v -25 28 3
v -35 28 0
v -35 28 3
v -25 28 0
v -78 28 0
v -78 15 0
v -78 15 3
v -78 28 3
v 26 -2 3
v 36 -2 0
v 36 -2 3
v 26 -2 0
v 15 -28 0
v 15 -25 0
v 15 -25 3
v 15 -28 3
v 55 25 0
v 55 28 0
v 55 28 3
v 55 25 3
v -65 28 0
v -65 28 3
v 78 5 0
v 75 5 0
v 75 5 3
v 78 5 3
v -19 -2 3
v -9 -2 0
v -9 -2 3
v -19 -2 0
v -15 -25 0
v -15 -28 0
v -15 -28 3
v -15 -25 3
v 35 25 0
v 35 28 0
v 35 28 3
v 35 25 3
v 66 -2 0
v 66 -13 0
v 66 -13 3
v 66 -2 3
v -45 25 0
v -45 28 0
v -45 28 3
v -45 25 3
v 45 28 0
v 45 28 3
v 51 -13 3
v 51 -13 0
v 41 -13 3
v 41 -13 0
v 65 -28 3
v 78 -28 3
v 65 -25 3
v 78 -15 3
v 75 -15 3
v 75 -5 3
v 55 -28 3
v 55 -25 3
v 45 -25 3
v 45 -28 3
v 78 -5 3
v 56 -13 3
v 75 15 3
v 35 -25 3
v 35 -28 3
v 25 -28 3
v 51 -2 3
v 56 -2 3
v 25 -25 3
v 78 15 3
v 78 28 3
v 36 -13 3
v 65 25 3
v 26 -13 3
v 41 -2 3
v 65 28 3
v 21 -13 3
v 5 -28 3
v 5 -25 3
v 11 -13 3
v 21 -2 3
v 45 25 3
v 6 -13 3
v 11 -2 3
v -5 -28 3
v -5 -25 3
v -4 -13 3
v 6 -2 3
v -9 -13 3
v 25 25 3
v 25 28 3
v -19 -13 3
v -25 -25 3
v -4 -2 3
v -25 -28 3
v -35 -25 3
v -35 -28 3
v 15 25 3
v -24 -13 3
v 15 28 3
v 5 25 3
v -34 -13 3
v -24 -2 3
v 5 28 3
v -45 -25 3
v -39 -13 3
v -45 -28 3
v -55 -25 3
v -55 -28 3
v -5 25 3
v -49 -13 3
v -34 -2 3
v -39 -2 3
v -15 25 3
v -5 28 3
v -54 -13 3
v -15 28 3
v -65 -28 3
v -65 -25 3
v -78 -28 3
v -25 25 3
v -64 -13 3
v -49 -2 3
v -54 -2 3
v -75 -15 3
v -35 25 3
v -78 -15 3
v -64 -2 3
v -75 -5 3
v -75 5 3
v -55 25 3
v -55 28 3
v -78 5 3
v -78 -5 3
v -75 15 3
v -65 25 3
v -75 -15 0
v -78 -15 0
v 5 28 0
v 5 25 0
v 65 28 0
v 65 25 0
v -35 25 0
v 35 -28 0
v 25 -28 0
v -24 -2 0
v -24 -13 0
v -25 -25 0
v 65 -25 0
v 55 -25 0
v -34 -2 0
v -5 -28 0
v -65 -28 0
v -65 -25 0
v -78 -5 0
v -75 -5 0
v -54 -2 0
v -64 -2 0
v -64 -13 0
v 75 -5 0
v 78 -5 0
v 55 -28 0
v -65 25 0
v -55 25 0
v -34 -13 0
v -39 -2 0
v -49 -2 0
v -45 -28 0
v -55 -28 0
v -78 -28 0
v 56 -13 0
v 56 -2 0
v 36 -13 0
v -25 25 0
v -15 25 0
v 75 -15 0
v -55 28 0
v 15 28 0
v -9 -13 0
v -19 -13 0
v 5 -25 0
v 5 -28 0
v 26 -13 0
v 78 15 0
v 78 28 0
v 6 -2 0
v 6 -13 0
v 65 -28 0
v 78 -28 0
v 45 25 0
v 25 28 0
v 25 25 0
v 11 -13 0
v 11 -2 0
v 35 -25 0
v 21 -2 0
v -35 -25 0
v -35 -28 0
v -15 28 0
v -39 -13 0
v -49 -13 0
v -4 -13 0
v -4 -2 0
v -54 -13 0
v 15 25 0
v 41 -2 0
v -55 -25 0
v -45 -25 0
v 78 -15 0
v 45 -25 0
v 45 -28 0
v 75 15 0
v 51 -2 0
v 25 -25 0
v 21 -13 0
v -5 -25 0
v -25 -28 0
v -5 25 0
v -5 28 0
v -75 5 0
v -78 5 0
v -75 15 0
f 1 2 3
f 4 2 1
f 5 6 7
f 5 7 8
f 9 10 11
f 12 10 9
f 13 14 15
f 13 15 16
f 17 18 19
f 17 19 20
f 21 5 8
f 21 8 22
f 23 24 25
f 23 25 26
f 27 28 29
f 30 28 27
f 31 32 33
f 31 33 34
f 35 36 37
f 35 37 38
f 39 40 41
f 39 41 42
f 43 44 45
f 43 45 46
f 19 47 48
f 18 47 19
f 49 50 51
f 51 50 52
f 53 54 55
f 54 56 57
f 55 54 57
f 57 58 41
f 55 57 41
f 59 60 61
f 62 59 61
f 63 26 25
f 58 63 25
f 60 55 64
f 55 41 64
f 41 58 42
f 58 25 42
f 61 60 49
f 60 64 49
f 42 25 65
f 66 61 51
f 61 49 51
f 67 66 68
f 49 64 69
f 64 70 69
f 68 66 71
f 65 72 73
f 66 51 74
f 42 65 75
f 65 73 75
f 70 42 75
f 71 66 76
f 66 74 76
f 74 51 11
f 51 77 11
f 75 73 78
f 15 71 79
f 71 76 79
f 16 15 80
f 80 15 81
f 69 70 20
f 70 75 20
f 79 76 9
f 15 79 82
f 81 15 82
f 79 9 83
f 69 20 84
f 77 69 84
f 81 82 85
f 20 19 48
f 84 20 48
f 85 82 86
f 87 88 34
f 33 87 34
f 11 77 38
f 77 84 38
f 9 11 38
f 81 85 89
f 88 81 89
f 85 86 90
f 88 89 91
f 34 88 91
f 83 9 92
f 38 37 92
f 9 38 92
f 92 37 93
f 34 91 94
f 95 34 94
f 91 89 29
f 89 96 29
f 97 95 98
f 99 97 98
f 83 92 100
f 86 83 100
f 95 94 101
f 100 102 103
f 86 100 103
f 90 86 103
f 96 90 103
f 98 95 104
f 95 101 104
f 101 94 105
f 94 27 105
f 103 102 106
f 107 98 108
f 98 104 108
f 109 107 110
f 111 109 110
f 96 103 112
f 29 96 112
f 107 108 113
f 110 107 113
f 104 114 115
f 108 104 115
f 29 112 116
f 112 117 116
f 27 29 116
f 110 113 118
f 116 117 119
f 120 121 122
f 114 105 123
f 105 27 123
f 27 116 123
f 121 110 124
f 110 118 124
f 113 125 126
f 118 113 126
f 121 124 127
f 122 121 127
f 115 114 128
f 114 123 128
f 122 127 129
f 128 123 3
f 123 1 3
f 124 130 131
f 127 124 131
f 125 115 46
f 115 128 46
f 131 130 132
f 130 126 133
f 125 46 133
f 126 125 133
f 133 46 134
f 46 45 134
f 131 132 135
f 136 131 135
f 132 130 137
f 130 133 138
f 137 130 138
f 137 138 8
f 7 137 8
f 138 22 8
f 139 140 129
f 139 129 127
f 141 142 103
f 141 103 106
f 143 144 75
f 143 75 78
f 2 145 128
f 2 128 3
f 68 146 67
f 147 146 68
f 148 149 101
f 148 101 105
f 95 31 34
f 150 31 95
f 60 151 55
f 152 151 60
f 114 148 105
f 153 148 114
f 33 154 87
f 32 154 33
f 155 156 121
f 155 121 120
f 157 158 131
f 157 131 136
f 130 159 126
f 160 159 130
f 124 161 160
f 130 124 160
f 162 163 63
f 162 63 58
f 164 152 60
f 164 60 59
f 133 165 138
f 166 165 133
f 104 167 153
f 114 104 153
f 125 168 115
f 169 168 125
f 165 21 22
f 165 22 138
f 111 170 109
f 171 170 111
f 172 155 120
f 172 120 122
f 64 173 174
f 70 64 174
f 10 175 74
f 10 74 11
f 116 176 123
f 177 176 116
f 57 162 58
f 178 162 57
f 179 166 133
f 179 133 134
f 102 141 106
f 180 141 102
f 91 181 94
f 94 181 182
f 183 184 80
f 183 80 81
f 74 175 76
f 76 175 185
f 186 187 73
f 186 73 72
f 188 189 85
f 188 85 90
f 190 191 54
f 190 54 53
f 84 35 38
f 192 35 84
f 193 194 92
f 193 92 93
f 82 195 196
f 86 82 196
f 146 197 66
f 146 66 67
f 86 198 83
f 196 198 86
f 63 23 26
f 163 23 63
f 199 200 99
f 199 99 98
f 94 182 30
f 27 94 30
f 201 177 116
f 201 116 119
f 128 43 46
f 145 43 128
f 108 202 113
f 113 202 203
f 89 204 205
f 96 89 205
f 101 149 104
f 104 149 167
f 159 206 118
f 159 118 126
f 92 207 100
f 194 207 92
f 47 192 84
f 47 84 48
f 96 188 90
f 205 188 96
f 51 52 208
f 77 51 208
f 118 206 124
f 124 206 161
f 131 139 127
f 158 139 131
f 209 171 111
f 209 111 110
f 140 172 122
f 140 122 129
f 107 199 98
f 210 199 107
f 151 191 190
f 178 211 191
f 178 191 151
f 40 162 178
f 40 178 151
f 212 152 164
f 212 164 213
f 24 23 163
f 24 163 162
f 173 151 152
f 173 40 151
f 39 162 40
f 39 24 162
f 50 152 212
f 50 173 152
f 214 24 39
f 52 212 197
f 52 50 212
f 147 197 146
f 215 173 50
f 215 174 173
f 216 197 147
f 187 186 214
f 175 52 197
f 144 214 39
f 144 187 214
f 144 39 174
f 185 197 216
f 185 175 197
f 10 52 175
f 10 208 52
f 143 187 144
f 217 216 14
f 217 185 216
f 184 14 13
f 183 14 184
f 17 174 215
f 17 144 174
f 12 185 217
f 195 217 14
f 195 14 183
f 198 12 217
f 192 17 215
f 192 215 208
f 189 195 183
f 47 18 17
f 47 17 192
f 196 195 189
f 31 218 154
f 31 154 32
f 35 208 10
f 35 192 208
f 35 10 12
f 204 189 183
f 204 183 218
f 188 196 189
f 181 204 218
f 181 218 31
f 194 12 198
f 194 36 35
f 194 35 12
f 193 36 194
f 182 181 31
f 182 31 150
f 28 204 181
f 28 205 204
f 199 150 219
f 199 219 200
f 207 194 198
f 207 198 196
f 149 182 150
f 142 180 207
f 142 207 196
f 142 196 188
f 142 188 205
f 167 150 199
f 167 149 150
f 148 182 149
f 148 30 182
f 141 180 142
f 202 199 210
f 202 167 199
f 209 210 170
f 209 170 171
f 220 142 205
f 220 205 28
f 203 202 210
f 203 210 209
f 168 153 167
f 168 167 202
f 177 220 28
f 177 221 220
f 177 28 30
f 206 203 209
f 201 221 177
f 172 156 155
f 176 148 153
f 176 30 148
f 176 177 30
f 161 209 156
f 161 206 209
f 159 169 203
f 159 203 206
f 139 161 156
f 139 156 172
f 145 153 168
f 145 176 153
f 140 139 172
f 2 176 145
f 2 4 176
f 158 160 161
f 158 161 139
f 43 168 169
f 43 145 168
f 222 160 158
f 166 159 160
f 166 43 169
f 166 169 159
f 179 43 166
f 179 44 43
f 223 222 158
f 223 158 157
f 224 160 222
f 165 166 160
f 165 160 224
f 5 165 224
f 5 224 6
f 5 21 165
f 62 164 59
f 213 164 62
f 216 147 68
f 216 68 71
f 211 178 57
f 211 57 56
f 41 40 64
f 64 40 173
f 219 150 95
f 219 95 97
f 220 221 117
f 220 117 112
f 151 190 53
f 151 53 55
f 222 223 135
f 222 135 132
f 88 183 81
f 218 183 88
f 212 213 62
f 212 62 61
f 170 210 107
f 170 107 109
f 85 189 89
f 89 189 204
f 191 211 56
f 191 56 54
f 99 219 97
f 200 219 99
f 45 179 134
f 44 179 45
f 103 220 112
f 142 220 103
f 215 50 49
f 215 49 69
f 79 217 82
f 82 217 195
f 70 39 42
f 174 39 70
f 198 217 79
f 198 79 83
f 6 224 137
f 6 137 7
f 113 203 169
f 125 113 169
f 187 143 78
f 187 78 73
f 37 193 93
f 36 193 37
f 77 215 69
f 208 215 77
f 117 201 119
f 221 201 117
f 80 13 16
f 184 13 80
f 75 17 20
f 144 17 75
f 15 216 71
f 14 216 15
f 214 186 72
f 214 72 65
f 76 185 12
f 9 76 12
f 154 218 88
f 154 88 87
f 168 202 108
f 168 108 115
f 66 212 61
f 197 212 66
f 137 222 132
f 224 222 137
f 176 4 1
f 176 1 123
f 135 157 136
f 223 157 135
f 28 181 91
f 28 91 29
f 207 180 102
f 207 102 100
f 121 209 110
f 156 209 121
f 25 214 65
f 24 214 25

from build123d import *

# Parameters (mm, degrees)
BOSS_EXTRUDE1_DEPTH = 3
SKETCH4_W           = 10
SKETCH4_H           = 11
CUT_EXTRUDE2_DEPTH  = 3


with BuildPart() as part:
    # Sketch1 → Boss-Extrude1 (new body)
    with BuildSketch(Plane.XY):
        Polygon((15, 28), (15, 25), (25, 25), (25, 28), (35, 28), (35, 25), (45, 25), (45, 28), (55, 28), (55, 25), (65, 25), (65, 28), (78, 28), (78, 15), (75, 15), (75, 5), (78, 5), (78, -5), (75, -5), (75, -15), (78, -15), (78, -28), (65, -28), (65, -25), (55, -25), (55, -28), (45, -28), (45, -25), (35, -25), (35, -28), (25, -28), (25, -25), (15, -25), (15, -28), (5, -28), (5, -25), (-5, -25), (-5, -28), (-15, -28), (-15, -25), (-25, -25), (-25, -28), (-35, -28), (-35, -25), (-45, -25), (-45, -28), (-55, -28), (-55, -25), (-65, -25), (-65, -28), (-78, -28), (-78, -15), (-75, -15), (-75, -5), (-78, -5), (-78, 5), (-75, 5), (-75, 15), (-78, 15), (-78, 28), (-65, 28), (-65, 25), (-55, 25), (-55, 28), (-45, 28), (-45, 25), (-35, 25), (-35, 28), (-25, 28), (-25, 25), (-15, 25), (-15, 28), (-5, 28), (-5, 25), (5, 25), (5, 28), align=None)
    extrude(amount=BOSS_EXTRUDE1_DEPTH)

    # Sketch4 → Cut-Extrude2 (cut)
    with BuildSketch(Plane(origin=(0, 0, 0), x_dir=(-1, 0, 0), z_dir=(0, 0, -1))):
        with Locations((-61, -7.5)):
            Rectangle(SKETCH4_W, SKETCH4_H)
        with Locations((-46, -7.5)):
            Rectangle(SKETCH4_W, SKETCH4_H)
        with Locations((-31, -7.5)):
            Rectangle(SKETCH4_W, SKETCH4_H)
        with Locations((-16, -7.5)):
            Rectangle(SKETCH4_W, SKETCH4_H)
        with Locations((-1, -7.5)):
            Rectangle(SKETCH4_W, SKETCH4_H)
        with Locations((14, -7.5)):
            Rectangle(SKETCH4_W, SKETCH4_H)
        with Locations((29, -7.5)):
            Rectangle(SKETCH4_W, SKETCH4_H)
        with Locations((44, -7.5)):
            Rectangle(SKETCH4_W, SKETCH4_H)
        with Locations((59, -7.5)):
            Rectangle(SKETCH4_W, SKETCH4_H)
    extrude(amount=-CUT_EXTRUDE2_DEPTH, mode=Mode.SUBTRACT)


solid = part.part
